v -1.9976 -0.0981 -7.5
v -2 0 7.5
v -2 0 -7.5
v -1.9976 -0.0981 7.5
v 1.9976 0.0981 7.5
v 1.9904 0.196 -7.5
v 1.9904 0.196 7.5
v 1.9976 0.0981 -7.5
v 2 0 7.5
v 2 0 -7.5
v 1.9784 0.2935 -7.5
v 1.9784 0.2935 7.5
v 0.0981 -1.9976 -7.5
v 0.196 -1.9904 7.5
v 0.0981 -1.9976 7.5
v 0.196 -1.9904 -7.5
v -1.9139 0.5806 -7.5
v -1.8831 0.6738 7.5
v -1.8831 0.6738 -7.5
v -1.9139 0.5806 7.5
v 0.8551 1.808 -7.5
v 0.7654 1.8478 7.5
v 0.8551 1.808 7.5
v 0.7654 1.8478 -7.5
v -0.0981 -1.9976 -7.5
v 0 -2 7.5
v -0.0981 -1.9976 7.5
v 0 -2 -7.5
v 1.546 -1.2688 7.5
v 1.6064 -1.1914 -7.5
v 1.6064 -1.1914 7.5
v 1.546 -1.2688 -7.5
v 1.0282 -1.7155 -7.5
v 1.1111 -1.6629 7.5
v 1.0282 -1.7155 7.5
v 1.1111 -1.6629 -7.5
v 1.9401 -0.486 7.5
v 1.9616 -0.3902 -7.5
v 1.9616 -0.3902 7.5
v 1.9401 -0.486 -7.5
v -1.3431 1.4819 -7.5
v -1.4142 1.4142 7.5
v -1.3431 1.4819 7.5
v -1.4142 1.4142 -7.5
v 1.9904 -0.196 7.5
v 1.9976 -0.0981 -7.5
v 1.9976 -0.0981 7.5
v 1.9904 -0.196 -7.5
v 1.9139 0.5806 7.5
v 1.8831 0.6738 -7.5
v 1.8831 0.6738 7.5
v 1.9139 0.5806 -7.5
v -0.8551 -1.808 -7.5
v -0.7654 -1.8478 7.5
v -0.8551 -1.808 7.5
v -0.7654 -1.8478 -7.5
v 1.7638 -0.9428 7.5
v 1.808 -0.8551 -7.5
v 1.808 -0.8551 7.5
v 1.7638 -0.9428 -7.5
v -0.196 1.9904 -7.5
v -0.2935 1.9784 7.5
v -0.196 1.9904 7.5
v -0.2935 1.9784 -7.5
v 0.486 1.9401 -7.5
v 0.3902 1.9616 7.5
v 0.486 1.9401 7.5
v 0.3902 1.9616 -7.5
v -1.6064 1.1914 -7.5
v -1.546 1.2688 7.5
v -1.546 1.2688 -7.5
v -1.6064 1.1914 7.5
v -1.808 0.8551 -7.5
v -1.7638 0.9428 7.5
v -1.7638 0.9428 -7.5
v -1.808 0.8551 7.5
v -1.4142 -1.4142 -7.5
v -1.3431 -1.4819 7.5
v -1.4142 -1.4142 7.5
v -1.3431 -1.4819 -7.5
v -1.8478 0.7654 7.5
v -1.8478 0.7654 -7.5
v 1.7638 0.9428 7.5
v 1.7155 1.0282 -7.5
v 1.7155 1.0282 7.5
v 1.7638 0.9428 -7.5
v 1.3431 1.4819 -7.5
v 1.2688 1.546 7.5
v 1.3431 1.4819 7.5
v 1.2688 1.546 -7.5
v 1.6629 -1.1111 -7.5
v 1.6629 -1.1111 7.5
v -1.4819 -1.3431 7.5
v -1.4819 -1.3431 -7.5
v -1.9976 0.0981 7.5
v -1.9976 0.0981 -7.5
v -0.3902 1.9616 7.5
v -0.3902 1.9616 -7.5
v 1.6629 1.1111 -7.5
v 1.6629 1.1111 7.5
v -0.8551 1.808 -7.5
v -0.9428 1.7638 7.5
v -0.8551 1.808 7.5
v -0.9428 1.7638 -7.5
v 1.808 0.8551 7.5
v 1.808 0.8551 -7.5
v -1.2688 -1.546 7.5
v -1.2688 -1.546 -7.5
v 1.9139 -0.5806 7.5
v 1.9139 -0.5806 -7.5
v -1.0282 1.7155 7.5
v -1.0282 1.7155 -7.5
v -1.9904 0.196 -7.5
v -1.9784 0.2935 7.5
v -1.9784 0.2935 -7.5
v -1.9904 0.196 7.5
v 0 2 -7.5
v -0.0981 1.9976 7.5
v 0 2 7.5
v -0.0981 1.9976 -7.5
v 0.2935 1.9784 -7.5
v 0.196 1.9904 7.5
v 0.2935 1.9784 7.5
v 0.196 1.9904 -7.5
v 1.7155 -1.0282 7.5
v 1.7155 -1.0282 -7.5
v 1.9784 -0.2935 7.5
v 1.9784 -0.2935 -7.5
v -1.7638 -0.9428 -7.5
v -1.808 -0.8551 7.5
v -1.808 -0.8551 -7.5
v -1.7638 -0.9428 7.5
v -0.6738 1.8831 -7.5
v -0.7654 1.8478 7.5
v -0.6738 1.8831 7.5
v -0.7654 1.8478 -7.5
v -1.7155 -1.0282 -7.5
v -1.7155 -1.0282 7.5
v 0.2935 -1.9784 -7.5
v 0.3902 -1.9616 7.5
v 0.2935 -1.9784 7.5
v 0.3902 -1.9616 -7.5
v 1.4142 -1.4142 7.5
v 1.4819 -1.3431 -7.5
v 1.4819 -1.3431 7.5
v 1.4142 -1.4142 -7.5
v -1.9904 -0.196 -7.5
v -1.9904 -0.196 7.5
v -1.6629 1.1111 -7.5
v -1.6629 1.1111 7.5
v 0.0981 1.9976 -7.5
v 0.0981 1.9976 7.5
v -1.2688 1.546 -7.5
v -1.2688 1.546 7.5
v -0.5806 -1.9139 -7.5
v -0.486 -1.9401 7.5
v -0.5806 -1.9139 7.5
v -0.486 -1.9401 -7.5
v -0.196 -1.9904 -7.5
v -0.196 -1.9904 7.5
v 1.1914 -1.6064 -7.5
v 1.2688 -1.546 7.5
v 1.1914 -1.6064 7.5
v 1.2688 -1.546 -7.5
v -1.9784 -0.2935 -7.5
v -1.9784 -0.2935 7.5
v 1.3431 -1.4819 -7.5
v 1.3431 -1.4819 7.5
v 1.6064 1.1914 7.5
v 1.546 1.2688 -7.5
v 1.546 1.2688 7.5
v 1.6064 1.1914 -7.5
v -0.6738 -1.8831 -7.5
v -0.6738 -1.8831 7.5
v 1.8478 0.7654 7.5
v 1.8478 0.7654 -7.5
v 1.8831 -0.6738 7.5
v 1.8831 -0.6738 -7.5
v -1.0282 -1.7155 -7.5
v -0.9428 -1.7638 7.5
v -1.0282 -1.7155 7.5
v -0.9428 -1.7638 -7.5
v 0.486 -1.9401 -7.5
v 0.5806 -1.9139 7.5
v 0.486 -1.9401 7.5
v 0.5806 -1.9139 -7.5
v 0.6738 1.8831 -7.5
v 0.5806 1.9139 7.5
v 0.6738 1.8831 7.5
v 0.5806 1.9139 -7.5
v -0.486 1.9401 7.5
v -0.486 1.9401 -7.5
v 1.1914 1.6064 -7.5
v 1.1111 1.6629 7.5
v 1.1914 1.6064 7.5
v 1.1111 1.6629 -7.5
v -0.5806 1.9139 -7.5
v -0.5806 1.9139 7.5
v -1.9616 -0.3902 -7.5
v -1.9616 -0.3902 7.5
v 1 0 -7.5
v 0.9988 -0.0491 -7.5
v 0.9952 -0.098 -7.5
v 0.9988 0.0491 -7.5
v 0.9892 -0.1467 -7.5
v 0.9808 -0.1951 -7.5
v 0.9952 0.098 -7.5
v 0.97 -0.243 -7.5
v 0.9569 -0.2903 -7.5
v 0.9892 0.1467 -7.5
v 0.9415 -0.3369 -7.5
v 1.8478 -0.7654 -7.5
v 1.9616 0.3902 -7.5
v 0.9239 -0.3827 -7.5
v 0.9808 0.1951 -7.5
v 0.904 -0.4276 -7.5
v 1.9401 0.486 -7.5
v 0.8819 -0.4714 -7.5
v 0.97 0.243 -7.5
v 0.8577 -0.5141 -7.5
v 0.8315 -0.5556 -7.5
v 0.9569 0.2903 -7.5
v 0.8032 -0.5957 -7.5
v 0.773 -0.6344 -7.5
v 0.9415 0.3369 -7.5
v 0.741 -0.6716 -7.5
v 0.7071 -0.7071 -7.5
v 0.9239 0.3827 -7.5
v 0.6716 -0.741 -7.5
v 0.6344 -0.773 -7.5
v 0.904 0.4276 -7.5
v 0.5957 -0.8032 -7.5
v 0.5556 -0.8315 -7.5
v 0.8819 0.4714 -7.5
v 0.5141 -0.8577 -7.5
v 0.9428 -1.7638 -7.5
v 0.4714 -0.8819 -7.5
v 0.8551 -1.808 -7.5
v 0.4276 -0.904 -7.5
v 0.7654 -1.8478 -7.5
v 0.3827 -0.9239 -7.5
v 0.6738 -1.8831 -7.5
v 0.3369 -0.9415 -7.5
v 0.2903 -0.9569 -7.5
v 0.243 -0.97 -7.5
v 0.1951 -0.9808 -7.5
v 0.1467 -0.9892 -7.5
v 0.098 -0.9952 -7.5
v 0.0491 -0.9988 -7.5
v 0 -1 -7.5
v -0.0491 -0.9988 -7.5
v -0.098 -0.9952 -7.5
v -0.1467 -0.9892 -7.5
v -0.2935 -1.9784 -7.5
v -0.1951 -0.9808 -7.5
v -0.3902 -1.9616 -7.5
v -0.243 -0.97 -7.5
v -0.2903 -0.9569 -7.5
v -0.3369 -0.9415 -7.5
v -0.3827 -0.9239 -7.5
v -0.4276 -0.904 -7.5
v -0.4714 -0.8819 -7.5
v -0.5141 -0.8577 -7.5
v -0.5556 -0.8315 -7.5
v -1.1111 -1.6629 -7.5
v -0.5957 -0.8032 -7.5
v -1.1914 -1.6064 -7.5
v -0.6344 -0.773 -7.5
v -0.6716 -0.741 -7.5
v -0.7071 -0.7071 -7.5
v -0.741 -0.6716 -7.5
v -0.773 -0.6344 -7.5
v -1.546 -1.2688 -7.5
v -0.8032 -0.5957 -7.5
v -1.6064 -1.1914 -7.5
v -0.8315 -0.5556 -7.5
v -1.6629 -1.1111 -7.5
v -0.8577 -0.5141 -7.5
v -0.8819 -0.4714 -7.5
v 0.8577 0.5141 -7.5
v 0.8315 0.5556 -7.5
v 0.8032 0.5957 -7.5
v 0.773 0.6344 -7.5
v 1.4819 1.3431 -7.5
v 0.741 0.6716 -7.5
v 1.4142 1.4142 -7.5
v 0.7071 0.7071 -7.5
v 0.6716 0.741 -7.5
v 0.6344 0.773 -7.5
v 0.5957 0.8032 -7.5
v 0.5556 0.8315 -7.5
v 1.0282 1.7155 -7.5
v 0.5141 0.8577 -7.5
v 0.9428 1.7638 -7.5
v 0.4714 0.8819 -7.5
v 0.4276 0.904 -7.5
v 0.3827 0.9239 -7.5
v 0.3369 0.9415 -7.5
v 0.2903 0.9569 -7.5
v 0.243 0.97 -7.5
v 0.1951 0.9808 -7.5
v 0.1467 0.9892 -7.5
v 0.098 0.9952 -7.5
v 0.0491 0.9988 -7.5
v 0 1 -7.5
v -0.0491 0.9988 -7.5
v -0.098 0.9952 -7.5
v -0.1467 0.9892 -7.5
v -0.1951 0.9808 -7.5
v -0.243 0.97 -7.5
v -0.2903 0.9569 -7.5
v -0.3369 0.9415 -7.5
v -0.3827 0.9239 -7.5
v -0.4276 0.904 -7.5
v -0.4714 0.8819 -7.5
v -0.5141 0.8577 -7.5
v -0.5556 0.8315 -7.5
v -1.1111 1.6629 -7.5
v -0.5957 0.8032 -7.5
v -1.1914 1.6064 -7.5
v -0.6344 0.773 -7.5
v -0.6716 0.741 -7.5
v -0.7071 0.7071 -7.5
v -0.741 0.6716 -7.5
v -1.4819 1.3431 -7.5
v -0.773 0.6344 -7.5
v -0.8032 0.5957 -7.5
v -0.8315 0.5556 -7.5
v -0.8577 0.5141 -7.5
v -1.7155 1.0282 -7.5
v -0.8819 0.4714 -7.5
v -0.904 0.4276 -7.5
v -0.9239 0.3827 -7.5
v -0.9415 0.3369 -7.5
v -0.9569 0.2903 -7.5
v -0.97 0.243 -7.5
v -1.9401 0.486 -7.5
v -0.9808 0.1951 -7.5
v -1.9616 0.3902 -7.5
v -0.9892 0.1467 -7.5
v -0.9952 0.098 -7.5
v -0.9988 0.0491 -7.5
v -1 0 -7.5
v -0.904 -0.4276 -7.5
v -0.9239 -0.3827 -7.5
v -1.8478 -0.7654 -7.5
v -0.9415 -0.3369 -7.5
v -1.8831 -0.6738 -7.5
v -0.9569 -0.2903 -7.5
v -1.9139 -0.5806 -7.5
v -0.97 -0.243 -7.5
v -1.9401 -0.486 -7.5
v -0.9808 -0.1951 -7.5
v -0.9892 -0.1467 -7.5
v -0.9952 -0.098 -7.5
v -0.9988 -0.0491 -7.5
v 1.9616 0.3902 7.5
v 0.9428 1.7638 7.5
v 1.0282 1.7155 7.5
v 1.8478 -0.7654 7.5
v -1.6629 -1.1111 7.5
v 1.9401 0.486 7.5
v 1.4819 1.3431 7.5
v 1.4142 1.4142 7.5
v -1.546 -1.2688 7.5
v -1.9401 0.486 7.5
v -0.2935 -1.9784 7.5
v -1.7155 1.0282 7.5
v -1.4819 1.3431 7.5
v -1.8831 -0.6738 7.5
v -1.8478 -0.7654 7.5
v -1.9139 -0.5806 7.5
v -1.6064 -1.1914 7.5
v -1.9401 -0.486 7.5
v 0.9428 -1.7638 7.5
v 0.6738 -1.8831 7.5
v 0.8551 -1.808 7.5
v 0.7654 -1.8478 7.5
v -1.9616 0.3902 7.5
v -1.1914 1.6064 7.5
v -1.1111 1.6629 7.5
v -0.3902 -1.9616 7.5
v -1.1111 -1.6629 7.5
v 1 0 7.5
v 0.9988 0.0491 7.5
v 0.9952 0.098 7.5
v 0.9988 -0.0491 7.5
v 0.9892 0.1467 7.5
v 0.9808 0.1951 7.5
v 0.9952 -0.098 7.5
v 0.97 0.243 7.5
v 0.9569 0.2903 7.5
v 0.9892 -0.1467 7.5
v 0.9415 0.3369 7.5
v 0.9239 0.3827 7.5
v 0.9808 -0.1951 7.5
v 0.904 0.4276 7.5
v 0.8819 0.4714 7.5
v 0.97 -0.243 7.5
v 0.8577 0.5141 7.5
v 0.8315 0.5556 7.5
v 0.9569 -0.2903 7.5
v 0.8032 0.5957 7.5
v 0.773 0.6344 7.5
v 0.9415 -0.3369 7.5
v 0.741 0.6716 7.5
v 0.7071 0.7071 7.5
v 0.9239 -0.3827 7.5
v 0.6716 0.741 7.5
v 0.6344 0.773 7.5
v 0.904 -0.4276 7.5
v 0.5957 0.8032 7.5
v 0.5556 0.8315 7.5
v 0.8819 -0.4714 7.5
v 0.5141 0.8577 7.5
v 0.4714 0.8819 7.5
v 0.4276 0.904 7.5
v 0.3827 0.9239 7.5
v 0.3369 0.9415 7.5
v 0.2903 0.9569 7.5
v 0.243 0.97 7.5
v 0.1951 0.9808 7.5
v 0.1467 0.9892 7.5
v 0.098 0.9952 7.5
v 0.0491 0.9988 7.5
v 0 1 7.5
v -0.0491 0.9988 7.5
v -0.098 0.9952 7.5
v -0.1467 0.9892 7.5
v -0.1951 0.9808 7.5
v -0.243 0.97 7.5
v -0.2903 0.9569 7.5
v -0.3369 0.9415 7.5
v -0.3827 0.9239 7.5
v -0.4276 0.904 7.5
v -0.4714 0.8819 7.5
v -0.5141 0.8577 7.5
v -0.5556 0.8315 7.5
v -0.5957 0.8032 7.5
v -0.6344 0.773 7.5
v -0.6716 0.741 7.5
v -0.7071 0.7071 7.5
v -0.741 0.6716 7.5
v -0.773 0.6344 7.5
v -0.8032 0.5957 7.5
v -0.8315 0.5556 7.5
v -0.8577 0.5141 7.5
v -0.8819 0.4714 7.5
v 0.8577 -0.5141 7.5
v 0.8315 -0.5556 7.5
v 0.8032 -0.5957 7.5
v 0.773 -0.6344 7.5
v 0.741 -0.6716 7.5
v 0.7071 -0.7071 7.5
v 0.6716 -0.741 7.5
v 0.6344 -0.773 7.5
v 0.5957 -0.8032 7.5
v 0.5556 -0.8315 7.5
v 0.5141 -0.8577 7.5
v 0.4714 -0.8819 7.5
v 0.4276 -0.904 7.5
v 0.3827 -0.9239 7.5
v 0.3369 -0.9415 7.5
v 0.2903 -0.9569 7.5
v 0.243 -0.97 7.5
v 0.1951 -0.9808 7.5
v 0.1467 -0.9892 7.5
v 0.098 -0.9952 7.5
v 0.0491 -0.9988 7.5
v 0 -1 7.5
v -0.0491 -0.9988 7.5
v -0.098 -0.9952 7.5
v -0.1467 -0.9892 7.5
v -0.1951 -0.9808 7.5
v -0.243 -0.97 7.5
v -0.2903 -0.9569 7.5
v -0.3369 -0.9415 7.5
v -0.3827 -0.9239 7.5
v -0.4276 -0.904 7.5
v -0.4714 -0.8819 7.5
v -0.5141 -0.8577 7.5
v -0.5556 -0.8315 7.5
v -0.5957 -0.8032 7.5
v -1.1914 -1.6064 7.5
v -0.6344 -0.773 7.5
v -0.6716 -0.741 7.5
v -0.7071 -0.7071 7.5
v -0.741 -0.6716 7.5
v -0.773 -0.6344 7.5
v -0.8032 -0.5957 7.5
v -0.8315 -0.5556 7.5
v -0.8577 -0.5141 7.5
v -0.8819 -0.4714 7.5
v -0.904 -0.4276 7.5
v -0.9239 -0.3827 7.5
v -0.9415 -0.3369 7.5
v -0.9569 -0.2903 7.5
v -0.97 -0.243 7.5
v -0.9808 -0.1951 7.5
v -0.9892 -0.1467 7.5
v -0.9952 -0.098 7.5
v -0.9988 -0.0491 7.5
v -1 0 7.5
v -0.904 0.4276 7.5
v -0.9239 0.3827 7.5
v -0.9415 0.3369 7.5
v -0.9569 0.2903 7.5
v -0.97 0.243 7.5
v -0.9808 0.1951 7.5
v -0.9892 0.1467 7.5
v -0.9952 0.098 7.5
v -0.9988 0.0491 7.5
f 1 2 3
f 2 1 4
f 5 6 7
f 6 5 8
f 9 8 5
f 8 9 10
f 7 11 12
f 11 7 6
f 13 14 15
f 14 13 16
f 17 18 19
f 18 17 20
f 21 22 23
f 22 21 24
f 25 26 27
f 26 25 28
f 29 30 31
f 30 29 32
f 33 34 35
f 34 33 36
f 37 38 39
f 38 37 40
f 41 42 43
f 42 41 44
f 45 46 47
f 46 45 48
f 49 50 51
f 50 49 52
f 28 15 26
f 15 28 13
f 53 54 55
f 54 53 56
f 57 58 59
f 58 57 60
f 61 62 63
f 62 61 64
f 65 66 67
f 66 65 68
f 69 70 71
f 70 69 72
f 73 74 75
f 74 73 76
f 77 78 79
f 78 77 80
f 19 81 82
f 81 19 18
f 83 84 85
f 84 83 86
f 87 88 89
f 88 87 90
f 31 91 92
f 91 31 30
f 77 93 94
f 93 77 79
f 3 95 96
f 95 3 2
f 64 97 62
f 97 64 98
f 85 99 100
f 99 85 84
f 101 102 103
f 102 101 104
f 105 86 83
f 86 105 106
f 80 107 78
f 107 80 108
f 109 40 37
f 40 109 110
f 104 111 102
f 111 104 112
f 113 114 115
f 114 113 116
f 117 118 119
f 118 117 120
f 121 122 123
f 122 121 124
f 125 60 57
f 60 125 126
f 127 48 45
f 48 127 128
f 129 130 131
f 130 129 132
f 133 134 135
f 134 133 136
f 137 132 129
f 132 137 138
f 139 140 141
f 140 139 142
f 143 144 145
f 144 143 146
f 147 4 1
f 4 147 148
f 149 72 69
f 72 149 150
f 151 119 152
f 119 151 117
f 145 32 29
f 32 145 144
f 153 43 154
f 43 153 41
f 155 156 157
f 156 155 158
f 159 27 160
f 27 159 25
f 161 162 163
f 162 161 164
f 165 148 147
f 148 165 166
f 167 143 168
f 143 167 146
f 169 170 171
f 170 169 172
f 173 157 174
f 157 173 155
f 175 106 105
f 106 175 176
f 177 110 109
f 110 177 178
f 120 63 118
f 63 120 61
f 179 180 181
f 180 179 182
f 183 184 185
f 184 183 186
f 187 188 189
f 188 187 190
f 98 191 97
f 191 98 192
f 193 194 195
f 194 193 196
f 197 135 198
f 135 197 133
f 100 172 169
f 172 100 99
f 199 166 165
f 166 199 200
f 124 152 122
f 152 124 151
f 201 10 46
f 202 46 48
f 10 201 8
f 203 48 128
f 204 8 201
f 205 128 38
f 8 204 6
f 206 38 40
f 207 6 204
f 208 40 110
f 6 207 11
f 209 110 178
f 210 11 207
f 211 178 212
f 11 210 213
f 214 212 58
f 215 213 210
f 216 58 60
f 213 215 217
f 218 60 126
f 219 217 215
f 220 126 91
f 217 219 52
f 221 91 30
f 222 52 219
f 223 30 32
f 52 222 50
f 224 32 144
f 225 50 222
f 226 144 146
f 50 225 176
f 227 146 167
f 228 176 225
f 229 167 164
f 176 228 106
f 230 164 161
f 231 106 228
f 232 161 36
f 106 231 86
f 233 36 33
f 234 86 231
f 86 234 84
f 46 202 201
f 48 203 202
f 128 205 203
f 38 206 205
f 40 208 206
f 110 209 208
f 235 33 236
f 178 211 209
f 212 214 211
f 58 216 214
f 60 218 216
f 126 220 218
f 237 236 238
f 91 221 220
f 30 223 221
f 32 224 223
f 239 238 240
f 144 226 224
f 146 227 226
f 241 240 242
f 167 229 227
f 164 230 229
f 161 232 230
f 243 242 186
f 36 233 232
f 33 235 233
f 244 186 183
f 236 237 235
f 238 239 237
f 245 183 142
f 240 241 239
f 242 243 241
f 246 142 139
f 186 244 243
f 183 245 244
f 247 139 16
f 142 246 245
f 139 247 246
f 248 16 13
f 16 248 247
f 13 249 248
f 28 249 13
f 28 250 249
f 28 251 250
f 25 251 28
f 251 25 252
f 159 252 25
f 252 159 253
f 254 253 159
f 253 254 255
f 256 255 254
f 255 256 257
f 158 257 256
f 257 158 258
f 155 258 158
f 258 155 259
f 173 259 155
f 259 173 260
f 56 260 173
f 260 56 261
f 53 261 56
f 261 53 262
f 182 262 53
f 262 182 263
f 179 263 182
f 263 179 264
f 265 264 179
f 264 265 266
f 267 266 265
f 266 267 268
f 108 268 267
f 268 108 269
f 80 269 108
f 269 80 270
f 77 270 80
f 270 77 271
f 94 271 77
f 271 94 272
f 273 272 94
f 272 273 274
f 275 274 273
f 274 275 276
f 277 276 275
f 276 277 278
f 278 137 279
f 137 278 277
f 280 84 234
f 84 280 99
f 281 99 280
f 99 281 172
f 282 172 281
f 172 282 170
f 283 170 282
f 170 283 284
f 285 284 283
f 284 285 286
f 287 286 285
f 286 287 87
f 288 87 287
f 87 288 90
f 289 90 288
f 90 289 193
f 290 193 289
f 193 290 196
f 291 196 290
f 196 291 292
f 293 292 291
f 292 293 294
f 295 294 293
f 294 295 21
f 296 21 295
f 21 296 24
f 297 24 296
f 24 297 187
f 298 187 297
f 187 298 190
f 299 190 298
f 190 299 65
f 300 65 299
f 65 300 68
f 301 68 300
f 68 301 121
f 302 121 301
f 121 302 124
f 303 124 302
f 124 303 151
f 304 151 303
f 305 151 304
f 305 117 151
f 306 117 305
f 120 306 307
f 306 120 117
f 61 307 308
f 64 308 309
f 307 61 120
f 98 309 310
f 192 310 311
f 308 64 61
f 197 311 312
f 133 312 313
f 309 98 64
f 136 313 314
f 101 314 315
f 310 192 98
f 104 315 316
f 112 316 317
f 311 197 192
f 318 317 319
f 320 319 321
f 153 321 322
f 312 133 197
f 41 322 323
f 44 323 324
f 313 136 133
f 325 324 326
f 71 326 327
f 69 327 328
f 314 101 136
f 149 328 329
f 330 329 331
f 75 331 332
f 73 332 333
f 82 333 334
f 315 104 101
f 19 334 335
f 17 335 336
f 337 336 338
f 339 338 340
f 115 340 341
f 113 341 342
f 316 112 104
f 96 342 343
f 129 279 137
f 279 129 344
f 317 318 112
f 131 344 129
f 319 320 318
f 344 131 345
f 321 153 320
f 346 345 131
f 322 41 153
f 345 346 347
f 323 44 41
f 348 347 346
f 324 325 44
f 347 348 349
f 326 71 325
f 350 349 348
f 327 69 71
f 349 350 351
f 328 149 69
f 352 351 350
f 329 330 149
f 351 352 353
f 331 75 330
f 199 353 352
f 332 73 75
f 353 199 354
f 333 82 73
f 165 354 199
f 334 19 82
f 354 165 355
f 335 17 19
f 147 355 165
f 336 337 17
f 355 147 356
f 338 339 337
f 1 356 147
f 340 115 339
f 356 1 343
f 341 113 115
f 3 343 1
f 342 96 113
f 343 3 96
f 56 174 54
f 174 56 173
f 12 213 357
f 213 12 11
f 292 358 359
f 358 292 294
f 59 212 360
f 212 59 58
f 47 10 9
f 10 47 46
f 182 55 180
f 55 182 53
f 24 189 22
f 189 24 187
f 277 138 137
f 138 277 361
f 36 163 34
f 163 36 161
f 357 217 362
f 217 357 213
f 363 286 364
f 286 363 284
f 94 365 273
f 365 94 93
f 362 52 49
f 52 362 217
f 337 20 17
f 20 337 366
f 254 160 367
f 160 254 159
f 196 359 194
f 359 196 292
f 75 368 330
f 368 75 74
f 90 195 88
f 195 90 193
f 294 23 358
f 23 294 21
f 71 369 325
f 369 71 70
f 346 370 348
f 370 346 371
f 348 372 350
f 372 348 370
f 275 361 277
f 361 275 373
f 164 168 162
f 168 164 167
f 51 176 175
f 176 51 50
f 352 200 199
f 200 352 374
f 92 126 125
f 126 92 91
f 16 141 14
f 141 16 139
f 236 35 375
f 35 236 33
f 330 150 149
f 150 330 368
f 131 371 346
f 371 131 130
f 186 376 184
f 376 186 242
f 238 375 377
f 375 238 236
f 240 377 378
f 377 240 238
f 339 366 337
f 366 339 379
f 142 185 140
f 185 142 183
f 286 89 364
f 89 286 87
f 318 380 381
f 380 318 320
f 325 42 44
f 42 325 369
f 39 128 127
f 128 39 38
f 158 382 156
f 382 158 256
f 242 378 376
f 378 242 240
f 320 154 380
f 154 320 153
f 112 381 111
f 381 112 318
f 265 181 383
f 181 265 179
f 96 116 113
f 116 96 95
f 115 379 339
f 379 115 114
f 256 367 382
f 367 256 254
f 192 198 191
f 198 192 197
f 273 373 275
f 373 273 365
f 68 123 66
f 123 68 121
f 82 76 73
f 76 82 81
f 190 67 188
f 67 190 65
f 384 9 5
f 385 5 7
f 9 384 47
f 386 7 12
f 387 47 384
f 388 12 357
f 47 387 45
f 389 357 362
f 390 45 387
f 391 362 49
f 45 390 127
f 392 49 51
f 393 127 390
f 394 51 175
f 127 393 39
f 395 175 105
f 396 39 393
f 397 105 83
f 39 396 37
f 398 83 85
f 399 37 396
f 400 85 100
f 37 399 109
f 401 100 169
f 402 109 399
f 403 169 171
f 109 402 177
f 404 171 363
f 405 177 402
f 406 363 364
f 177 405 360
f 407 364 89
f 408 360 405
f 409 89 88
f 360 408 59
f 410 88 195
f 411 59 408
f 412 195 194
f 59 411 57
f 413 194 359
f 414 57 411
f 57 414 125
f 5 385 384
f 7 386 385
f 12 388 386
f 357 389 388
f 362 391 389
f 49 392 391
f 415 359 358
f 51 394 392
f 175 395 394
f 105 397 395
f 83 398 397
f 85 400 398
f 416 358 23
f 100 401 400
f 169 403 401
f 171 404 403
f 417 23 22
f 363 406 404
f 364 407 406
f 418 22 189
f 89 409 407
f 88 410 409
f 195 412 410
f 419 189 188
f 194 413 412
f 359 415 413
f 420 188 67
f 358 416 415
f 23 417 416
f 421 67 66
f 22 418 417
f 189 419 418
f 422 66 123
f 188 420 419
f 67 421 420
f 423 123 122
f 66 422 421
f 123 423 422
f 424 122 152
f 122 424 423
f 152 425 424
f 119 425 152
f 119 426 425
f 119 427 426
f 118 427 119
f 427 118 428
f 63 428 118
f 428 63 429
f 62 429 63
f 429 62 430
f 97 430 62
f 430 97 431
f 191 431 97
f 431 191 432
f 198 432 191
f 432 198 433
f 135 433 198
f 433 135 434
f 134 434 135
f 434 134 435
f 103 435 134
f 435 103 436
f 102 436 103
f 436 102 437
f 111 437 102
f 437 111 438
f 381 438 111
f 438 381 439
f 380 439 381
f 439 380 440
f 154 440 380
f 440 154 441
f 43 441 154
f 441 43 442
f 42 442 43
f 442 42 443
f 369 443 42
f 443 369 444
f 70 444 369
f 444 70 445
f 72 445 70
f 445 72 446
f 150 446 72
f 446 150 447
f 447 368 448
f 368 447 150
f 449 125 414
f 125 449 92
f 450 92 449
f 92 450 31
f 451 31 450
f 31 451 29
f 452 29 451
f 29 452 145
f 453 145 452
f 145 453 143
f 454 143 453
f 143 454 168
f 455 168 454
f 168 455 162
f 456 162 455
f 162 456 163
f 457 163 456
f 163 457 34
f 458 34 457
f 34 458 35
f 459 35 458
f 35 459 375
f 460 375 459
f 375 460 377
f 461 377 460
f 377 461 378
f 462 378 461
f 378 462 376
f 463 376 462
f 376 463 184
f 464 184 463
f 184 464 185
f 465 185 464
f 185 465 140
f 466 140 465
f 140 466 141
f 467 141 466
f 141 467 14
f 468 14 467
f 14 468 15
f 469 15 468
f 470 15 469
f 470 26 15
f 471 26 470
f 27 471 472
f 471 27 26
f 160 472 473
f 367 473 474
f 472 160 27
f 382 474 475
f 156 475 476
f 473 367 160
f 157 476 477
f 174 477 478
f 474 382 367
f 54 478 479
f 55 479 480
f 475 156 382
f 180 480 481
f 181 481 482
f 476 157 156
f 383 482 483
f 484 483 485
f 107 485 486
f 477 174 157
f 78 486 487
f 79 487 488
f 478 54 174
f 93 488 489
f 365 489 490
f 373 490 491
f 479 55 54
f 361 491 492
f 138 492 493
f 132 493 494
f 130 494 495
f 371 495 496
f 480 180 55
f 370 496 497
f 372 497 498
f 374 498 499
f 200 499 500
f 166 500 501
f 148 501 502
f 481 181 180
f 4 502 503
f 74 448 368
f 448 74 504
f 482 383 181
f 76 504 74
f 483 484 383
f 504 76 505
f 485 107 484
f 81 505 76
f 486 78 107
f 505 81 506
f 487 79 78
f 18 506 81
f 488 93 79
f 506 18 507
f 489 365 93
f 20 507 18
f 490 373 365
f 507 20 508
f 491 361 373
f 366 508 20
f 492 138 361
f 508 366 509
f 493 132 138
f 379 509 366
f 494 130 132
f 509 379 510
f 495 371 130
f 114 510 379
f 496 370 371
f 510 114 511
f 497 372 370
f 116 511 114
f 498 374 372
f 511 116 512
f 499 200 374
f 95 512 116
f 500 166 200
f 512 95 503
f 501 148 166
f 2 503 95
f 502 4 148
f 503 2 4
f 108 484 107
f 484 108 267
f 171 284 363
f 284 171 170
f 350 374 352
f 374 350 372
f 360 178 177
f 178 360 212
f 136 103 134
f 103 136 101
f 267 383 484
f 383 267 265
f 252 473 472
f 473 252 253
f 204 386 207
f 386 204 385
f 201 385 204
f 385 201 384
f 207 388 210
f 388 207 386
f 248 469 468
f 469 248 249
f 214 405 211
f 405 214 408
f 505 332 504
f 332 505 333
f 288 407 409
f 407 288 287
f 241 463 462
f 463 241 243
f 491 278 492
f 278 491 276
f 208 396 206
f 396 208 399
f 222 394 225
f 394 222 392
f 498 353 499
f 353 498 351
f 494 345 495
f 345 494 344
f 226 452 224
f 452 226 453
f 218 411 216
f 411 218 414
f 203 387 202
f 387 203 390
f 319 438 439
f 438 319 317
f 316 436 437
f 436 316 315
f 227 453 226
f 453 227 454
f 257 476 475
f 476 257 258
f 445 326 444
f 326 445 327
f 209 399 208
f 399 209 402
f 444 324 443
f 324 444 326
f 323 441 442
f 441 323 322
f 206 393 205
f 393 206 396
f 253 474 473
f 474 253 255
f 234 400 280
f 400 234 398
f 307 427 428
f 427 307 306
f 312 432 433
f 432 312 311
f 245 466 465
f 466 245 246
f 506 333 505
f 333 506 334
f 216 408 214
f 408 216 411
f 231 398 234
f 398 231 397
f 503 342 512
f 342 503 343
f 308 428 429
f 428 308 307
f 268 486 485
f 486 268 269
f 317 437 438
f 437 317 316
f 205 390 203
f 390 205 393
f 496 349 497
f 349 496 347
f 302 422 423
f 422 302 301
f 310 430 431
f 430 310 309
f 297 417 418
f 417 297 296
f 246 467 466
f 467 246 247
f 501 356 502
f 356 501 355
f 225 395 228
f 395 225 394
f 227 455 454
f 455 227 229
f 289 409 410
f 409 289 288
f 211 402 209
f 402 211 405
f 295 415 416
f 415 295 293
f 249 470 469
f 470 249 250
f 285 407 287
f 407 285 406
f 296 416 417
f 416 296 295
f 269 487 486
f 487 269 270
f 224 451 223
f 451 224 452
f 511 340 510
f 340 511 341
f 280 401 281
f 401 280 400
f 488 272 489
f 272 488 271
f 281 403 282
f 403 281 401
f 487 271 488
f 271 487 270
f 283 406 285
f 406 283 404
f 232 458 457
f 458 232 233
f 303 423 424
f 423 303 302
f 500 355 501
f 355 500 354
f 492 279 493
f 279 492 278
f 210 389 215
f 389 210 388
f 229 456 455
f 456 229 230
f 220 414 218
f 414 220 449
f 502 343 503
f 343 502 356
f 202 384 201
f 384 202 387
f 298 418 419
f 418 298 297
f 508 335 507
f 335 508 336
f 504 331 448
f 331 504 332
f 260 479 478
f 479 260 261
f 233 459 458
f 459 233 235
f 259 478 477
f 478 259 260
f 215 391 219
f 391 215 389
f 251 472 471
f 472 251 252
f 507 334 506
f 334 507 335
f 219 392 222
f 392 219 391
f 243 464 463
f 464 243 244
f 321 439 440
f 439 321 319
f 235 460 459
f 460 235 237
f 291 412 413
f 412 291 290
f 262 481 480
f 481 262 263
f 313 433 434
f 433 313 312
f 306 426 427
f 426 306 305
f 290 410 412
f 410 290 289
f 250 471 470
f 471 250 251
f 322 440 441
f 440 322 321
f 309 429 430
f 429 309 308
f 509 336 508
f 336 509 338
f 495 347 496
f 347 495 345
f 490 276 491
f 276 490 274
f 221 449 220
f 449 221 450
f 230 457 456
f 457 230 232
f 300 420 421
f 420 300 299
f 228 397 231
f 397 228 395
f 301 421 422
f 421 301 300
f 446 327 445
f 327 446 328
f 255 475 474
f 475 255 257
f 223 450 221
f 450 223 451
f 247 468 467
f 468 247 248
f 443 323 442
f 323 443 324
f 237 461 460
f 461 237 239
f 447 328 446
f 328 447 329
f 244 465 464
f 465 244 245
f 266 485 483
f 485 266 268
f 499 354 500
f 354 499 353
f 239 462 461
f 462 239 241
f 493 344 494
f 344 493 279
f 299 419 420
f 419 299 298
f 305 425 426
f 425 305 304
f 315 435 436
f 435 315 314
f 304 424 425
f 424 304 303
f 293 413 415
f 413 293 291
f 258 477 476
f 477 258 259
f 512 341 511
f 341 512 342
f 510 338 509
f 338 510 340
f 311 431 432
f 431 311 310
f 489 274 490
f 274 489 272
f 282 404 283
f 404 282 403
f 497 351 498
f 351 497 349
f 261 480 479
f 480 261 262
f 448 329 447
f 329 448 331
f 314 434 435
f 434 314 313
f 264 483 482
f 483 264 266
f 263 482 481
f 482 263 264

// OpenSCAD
// Parameters
length = 15; //[8:30:1]
od = 4; //[2:8:0.1]
id = 2; //[1:6:0.1]
center = true; //[0:1:1]
forced_id = 0; //[0:6:0.1]
eps = 0.8; //[0.5:2:0.1]
bore_d = 2; //[1:6:0.1]
z_offset = 0; //[-30:30:1]

// Smoothness
$fn = 128;

// Tubing - circular PTFE tube with circular bore
module tubing() {
  // Choose bore diameter: forced_id overrides, else use id, else bore_d
  bore = (forced_id > 0) ? forced_id : ((id > 0) ? id : bore_d);

  // Ensure valid tube wall thickness
  bore_clamped = min(bore, max(od - 0.2, 0.01));

  // Place inner cutter so it always fully spans the outer cylinder regardless of centering
  inner_h = length + 2*eps;
  inner_z = center ? 0 : (length/2);

  color([0.85, 0.85, 0.8])
  difference() {
    cylinder(h=length, r=od/2, center=center);
    translate([0, 0, inner_z])
      cylinder(h=inner_h, r=bore_clamped/2, center=true);
  }
}

// Assembly
module assembly() {
  translate([0, 0, z_offset]) tubing();
}

assembly();
